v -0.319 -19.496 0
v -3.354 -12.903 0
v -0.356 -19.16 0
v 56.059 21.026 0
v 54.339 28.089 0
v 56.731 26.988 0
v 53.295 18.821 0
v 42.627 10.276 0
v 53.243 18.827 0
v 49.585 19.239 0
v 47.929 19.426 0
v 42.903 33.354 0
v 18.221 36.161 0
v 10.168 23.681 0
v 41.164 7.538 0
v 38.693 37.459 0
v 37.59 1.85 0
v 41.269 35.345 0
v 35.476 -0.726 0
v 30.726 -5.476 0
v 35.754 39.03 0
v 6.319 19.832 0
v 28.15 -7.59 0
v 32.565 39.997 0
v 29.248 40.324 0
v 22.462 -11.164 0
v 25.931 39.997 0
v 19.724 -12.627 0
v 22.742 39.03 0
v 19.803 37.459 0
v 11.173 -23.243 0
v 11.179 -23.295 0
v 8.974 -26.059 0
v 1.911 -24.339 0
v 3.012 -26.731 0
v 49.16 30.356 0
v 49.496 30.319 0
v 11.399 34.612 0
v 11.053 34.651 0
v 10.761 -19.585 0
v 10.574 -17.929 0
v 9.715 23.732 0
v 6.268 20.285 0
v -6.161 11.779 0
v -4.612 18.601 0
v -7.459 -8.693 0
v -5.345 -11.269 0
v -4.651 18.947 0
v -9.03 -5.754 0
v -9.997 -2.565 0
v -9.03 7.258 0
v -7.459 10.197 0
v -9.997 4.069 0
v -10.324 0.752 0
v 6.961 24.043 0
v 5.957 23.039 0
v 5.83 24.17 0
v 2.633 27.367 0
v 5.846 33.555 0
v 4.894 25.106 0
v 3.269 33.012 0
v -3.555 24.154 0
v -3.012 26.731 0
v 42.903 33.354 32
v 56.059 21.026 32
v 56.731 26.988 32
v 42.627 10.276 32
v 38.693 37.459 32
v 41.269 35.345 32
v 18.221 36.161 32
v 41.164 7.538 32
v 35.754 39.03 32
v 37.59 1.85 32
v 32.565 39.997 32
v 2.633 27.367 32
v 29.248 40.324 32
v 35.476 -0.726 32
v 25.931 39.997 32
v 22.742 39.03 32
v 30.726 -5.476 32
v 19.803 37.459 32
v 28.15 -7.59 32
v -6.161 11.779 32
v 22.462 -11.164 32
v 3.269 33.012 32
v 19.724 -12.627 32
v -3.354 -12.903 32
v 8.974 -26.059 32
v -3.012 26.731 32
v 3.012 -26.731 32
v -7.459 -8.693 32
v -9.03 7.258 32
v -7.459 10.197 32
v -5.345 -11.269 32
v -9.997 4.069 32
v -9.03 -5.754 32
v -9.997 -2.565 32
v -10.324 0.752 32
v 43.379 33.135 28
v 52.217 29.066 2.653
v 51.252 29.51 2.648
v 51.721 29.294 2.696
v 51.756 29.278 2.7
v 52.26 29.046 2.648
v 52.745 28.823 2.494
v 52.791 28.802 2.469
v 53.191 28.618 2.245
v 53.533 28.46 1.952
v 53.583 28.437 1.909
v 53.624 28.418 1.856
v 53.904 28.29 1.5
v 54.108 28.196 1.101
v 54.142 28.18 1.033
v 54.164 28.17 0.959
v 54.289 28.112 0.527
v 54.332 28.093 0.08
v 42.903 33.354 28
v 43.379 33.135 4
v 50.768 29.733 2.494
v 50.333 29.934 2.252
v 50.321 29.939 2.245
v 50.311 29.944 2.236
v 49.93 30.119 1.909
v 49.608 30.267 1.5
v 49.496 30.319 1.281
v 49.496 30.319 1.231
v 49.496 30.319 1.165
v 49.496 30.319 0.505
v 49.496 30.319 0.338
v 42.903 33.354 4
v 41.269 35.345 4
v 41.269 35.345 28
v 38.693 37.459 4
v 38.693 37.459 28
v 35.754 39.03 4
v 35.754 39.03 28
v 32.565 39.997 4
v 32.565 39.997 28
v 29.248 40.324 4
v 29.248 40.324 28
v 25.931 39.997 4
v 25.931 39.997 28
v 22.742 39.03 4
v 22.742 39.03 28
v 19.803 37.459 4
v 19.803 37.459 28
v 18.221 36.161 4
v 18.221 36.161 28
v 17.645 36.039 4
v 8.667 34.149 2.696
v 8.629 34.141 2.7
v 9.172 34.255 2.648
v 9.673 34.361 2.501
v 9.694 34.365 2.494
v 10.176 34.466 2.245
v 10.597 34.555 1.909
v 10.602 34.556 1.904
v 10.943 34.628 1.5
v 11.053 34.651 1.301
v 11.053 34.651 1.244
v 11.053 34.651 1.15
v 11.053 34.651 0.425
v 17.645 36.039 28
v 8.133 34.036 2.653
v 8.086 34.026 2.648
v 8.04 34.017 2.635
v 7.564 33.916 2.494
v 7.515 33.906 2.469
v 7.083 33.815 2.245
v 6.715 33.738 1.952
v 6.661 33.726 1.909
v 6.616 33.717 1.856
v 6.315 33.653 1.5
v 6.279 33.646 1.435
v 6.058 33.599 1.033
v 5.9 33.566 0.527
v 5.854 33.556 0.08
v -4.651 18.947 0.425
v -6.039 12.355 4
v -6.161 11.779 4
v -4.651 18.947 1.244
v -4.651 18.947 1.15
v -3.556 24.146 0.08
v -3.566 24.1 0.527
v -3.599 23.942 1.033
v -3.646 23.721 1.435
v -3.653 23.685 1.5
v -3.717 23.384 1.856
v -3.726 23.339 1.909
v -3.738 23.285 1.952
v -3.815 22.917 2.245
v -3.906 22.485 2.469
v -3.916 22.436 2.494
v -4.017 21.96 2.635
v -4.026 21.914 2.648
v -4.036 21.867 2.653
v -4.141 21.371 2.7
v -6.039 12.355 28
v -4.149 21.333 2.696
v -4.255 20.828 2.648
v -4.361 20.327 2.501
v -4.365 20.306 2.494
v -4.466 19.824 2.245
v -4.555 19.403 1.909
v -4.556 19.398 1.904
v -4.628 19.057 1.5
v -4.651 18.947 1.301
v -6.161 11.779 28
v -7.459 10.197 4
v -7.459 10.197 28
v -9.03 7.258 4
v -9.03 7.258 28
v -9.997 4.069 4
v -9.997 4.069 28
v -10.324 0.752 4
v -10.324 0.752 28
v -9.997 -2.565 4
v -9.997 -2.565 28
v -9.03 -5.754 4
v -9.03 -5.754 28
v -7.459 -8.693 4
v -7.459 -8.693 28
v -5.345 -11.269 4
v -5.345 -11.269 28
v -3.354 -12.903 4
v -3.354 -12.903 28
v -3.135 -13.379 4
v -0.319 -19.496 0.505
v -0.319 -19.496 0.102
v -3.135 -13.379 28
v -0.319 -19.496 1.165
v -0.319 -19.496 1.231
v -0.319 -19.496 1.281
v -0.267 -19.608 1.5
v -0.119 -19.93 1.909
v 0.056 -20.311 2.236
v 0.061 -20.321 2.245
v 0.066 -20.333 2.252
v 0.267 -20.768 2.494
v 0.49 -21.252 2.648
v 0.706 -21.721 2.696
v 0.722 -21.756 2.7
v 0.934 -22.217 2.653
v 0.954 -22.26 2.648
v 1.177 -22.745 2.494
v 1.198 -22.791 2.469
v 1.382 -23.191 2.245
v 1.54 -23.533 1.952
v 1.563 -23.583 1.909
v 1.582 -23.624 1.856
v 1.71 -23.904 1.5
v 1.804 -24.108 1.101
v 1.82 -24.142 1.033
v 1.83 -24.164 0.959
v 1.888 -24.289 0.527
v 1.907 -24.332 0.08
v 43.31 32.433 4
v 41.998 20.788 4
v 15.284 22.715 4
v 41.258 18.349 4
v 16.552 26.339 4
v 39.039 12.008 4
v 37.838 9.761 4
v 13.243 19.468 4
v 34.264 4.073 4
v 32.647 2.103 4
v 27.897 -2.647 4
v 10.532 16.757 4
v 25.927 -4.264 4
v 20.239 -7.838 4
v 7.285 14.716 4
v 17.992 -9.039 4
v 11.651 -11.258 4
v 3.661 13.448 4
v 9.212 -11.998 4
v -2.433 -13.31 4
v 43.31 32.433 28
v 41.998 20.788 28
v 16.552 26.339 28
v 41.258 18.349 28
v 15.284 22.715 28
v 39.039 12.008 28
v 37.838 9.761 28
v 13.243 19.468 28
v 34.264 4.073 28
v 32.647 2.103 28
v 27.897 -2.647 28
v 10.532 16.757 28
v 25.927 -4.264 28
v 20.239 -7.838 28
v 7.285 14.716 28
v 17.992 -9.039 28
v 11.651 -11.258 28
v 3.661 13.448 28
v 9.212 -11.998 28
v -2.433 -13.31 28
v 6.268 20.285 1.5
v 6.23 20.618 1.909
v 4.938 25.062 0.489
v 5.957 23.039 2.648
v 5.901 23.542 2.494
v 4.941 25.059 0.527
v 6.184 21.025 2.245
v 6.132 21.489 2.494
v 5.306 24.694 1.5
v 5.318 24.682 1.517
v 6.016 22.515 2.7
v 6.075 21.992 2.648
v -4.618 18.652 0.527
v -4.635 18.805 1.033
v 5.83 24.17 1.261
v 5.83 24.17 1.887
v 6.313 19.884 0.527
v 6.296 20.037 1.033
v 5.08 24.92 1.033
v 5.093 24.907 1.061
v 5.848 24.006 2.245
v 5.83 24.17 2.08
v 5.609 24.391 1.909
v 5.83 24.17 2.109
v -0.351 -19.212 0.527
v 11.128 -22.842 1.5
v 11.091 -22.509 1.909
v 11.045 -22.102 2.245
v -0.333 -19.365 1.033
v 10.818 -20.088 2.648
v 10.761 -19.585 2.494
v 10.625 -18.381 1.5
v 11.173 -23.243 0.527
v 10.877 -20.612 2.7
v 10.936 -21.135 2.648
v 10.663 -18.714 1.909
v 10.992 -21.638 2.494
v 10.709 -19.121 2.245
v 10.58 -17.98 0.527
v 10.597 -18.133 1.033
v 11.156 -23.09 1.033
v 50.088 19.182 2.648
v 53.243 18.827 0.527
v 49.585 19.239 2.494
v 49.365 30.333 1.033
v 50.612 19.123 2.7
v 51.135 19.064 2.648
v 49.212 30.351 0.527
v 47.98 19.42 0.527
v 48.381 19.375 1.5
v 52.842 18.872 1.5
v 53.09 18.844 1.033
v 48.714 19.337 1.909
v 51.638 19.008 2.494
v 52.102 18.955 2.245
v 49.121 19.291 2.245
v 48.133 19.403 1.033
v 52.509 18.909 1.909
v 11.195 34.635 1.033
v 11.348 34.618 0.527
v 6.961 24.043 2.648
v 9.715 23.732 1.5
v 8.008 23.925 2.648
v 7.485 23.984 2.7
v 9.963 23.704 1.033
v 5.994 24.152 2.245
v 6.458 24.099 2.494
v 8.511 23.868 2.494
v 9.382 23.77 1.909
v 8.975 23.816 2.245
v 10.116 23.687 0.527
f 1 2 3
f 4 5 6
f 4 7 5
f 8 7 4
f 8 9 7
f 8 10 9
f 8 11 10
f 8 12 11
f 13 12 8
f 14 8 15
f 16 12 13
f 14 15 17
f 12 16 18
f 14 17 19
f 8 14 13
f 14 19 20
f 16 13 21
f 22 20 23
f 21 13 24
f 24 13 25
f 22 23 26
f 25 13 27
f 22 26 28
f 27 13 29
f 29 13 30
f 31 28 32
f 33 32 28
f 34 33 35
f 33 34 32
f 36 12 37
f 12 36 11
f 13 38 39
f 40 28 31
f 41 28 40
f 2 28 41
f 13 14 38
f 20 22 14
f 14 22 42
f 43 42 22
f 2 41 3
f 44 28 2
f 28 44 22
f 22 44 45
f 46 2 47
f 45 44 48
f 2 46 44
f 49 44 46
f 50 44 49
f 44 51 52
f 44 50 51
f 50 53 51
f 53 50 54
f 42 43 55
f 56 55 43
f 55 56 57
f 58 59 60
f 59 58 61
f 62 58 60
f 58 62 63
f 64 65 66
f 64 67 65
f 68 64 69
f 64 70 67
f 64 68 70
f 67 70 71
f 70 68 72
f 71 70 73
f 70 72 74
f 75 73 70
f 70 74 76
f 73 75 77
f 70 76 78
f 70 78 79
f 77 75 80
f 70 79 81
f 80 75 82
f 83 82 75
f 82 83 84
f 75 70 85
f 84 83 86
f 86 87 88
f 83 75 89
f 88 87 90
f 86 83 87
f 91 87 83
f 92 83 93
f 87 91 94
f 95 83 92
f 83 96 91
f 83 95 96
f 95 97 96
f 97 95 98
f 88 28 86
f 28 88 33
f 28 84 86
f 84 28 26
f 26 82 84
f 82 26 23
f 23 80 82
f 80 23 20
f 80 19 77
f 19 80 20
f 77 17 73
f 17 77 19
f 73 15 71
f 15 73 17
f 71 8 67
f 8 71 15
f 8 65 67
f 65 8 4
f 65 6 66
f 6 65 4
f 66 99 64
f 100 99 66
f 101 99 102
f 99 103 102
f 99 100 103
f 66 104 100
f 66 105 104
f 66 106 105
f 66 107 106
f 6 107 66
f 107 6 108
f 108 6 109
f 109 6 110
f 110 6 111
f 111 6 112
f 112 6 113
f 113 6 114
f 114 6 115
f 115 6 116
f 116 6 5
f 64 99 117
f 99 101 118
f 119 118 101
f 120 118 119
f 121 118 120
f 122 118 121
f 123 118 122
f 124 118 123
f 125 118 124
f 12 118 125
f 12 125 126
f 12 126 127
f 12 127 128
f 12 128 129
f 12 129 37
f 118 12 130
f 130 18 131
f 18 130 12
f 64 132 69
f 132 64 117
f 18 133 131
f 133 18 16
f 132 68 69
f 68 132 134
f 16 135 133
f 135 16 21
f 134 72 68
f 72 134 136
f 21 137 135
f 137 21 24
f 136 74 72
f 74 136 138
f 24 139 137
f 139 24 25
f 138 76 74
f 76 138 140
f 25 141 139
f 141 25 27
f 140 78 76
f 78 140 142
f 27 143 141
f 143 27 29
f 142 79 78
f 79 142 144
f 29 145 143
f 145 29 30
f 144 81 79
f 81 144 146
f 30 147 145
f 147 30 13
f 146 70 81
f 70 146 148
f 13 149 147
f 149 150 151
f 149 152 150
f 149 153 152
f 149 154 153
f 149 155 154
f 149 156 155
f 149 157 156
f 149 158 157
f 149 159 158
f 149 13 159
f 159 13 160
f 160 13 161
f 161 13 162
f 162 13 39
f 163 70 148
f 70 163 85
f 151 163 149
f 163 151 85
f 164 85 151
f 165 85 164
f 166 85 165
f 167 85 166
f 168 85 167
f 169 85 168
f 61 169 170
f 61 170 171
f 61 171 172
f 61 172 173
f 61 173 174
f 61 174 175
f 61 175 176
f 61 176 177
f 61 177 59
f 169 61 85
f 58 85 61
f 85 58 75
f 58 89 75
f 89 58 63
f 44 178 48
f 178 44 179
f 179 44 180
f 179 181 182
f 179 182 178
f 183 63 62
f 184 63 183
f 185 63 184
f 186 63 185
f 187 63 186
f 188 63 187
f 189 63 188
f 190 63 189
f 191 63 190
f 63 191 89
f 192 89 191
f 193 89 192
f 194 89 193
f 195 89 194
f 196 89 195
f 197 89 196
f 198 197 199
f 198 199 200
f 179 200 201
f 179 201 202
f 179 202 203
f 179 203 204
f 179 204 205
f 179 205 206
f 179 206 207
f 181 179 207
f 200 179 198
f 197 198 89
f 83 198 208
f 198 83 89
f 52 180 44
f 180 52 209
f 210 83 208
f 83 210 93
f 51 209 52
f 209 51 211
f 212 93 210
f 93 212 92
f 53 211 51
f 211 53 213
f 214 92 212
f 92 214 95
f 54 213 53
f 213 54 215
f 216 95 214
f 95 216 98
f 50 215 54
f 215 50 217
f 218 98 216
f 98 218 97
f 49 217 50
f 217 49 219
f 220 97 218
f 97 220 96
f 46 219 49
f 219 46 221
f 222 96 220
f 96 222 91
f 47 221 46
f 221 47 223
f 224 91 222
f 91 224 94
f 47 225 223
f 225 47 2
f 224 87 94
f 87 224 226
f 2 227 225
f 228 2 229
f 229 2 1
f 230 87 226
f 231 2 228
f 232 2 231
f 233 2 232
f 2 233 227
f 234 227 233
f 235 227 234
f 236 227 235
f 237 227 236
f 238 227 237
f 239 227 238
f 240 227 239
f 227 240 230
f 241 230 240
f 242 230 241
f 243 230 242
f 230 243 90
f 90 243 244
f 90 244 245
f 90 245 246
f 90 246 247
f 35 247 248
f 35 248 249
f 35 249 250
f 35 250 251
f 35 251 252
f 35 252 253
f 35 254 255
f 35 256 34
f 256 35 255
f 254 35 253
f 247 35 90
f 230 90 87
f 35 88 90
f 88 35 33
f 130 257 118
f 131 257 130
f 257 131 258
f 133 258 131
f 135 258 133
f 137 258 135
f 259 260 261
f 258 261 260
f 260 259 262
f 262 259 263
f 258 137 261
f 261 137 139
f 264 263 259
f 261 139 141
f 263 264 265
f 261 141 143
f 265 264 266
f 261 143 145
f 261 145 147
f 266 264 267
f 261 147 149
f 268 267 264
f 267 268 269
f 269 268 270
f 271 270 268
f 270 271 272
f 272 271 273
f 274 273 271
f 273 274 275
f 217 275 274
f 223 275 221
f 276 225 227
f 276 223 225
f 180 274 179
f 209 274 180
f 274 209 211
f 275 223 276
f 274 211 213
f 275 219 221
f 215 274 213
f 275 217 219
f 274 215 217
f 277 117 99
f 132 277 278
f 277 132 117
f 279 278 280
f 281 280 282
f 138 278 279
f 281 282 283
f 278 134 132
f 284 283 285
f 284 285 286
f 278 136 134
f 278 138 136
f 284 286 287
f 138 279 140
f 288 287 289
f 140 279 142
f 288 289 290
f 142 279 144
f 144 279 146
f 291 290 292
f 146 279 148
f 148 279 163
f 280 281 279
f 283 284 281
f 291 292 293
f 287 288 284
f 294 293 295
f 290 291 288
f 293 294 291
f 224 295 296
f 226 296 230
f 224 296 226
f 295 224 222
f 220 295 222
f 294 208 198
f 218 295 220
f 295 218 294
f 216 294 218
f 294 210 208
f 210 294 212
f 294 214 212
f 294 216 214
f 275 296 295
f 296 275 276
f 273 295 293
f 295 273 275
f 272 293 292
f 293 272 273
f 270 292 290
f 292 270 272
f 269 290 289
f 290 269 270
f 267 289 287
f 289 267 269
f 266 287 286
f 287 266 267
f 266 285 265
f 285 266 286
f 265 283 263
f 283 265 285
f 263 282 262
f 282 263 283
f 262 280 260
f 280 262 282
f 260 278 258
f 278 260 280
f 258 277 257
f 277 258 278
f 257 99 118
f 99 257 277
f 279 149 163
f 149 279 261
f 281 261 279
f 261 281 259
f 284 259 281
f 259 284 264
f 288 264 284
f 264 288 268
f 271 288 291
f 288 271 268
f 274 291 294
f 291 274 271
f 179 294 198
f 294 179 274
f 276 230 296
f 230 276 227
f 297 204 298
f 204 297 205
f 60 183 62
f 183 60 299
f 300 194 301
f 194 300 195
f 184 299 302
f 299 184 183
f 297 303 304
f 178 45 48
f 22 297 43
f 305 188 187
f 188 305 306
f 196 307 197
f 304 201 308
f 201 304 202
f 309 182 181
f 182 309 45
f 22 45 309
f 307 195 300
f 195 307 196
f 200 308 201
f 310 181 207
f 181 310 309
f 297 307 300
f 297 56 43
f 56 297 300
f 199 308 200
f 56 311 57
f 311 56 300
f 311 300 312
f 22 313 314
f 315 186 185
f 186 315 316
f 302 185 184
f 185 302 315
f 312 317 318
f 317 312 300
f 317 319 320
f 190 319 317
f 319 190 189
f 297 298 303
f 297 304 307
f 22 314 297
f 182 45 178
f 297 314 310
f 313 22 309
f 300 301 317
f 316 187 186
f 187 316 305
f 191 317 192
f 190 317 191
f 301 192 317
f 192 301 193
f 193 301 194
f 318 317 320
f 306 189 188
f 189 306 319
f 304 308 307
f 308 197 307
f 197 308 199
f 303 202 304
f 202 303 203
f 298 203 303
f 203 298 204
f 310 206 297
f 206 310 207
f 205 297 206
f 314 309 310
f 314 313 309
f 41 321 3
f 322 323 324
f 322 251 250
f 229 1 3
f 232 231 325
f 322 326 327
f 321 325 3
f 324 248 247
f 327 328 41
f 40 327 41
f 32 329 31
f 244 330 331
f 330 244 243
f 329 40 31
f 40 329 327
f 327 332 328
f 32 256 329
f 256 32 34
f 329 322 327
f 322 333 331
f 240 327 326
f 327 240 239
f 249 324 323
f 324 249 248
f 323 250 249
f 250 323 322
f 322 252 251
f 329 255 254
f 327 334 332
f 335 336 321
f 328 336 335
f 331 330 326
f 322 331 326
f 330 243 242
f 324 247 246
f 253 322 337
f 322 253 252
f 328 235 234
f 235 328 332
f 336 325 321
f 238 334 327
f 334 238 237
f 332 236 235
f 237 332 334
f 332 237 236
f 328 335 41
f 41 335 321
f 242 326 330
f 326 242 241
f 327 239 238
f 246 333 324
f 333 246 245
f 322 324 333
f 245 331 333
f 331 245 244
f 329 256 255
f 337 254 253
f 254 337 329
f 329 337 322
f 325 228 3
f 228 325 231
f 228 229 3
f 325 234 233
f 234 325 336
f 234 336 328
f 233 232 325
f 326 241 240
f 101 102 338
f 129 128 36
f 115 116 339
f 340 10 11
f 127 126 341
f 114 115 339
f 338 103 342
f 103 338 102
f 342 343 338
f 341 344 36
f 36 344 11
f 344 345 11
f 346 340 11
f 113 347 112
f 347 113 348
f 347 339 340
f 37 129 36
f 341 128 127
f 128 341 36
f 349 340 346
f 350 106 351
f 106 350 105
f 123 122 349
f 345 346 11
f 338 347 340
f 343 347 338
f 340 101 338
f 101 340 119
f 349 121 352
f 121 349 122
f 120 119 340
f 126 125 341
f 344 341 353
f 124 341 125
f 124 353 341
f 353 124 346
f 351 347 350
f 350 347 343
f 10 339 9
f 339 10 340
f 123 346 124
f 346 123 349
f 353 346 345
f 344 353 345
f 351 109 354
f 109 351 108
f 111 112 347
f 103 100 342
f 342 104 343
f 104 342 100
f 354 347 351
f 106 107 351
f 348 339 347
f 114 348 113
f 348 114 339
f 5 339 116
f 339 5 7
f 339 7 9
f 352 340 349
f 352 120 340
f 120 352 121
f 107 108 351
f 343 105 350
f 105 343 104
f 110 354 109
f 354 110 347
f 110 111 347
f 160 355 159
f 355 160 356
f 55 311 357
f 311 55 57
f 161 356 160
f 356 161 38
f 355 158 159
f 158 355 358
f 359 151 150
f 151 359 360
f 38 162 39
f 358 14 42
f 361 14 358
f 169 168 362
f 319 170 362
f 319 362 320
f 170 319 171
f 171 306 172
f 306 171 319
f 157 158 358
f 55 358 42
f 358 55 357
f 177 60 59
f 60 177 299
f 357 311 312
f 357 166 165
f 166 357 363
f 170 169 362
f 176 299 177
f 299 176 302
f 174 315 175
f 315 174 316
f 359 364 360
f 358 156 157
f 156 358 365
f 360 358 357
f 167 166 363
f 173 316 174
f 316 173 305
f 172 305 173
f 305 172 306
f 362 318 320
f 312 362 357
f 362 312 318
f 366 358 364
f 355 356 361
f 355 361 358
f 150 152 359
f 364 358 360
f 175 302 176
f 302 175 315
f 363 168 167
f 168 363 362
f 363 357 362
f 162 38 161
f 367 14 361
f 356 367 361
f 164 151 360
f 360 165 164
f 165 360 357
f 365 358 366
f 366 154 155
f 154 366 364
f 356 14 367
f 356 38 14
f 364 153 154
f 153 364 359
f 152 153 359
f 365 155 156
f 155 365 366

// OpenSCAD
$fn = 32;

// ----------------------------------------------------------------------
// Air duct: 34 mm duct, 4 mm wall, 32 mm across
// ----------------------------------------------------------------------

// --- parameters (mm) ---
duct_r = 17;              // duct core radius
duct_d = 34;              // duct core diameter
wall = 4;                 // duct wall thickness
height = 32;              // duct width (extrusion height)
port_r = 26.9;            // port flange half width
port_d = 53.8;            // port flange width
port_t = 6;               // port flange thickness
bolt_d = 5.4;             // port bolt holes
bolt_offset = 21.7;       // bolt hole offset from the port axis

difference() {
  /* outer hull chain: tube with a flat flange plate at every port */
  linear_extrude(height = 32) {
    hull() {
      polygon([[3.012, -26.731], [-3.012, 26.731], [2.95, 27.403], [8.974, -26.059]]);
      translate([8.943, 1.008]) circle(r = 17);
    }
    hull() {
      translate([8.943, 1.008]) circle(r = 17);
      translate([6.676, 0.752]) circle(r = 17);
    }
    hull() {
      translate([6.676, 0.752]) circle(r = 17);
      translate([13.017, 2.971]) circle(r = 17);
    }
    hull() {
      translate([13.017, 2.971]) circle(r = 17);
      translate([18.705, 6.545]) circle(r = 17);
    }
    hull() {
      translate([18.705, 6.545]) circle(r = 17);
      translate([23.455, 11.295]) circle(r = 17);
    }
    hull() {
      translate([23.455, 11.295]) circle(r = 17);
      translate([27.029, 16.983]) circle(r = 17);
    }
    hull() {
      translate([27.029, 16.983]) circle(r = 17);
      translate([29.248, 23.324]) circle(r = 17);
    }
    hull() {
      translate([29.248, 23.324]) circle(r = 17);
      translate([28.992, 21.057]) circle(r = 17);
    }
    hull() {
      translate([28.992, 21.057]) circle(r = 17);
      polygon([[3.269, 33.012], [56.731, 26.988], [56.059, 21.026], [2.597, 27.05]]);
    }
  }
  /* air passage: the same chain inset by the wall, 5 mm proud of the ports */
  translate([0, 0, 4]) linear_extrude(height = 24) {
    hull() {
      translate([-4.969, -0.56]) circle(r = 13);
      translate([6.676, 0.752]) circle(r = 13);
    }
    hull() {
      translate([6.676, 0.752]) circle(r = 13);
      translate([13.017, 2.971]) circle(r = 13);
    }
    hull() {
      translate([13.017, 2.971]) circle(r = 13);
      translate([18.705, 6.545]) circle(r = 13);
    }
    hull() {
      translate([18.705, 6.545]) circle(r = 13);
      translate([23.455, 11.295]) circle(r = 13);
    }
    hull() {
      translate([23.455, 11.295]) circle(r = 13);
      translate([27.029, 16.983]) circle(r = 13);
    }
    hull() {
      translate([27.029, 16.983]) circle(r = 13);
      translate([29.248, 23.324]) circle(r = 13);
    }
    hull() {
      translate([29.248, 23.324]) circle(r = 13);
      translate([30.56, 34.969]) circle(r = 13);
    }
  }
  translate([0, 0]) rotate([0, 0, -83.57]) translate([-21.7, -2.5]) rotate([-90, 0, 0]) cylinder(h = 11, d = 5.4);
  translate([0, 0]) rotate([0, 0, -83.57]) translate([21.7, -2.5]) rotate([-90, 0, 0]) cylinder(h = 11, d = 5.4);
  translate([30, 30]) rotate([0, 0, 173.57]) translate([-21.7, -2.5]) rotate([-90, 0, 0]) cylinder(h = 11, d = 5.4);
  translate([30, 30]) rotate([0, 0, 173.57]) translate([21.7, -2.5]) rotate([-90, 0, 0]) cylinder(h = 11, d = 5.4);
}
